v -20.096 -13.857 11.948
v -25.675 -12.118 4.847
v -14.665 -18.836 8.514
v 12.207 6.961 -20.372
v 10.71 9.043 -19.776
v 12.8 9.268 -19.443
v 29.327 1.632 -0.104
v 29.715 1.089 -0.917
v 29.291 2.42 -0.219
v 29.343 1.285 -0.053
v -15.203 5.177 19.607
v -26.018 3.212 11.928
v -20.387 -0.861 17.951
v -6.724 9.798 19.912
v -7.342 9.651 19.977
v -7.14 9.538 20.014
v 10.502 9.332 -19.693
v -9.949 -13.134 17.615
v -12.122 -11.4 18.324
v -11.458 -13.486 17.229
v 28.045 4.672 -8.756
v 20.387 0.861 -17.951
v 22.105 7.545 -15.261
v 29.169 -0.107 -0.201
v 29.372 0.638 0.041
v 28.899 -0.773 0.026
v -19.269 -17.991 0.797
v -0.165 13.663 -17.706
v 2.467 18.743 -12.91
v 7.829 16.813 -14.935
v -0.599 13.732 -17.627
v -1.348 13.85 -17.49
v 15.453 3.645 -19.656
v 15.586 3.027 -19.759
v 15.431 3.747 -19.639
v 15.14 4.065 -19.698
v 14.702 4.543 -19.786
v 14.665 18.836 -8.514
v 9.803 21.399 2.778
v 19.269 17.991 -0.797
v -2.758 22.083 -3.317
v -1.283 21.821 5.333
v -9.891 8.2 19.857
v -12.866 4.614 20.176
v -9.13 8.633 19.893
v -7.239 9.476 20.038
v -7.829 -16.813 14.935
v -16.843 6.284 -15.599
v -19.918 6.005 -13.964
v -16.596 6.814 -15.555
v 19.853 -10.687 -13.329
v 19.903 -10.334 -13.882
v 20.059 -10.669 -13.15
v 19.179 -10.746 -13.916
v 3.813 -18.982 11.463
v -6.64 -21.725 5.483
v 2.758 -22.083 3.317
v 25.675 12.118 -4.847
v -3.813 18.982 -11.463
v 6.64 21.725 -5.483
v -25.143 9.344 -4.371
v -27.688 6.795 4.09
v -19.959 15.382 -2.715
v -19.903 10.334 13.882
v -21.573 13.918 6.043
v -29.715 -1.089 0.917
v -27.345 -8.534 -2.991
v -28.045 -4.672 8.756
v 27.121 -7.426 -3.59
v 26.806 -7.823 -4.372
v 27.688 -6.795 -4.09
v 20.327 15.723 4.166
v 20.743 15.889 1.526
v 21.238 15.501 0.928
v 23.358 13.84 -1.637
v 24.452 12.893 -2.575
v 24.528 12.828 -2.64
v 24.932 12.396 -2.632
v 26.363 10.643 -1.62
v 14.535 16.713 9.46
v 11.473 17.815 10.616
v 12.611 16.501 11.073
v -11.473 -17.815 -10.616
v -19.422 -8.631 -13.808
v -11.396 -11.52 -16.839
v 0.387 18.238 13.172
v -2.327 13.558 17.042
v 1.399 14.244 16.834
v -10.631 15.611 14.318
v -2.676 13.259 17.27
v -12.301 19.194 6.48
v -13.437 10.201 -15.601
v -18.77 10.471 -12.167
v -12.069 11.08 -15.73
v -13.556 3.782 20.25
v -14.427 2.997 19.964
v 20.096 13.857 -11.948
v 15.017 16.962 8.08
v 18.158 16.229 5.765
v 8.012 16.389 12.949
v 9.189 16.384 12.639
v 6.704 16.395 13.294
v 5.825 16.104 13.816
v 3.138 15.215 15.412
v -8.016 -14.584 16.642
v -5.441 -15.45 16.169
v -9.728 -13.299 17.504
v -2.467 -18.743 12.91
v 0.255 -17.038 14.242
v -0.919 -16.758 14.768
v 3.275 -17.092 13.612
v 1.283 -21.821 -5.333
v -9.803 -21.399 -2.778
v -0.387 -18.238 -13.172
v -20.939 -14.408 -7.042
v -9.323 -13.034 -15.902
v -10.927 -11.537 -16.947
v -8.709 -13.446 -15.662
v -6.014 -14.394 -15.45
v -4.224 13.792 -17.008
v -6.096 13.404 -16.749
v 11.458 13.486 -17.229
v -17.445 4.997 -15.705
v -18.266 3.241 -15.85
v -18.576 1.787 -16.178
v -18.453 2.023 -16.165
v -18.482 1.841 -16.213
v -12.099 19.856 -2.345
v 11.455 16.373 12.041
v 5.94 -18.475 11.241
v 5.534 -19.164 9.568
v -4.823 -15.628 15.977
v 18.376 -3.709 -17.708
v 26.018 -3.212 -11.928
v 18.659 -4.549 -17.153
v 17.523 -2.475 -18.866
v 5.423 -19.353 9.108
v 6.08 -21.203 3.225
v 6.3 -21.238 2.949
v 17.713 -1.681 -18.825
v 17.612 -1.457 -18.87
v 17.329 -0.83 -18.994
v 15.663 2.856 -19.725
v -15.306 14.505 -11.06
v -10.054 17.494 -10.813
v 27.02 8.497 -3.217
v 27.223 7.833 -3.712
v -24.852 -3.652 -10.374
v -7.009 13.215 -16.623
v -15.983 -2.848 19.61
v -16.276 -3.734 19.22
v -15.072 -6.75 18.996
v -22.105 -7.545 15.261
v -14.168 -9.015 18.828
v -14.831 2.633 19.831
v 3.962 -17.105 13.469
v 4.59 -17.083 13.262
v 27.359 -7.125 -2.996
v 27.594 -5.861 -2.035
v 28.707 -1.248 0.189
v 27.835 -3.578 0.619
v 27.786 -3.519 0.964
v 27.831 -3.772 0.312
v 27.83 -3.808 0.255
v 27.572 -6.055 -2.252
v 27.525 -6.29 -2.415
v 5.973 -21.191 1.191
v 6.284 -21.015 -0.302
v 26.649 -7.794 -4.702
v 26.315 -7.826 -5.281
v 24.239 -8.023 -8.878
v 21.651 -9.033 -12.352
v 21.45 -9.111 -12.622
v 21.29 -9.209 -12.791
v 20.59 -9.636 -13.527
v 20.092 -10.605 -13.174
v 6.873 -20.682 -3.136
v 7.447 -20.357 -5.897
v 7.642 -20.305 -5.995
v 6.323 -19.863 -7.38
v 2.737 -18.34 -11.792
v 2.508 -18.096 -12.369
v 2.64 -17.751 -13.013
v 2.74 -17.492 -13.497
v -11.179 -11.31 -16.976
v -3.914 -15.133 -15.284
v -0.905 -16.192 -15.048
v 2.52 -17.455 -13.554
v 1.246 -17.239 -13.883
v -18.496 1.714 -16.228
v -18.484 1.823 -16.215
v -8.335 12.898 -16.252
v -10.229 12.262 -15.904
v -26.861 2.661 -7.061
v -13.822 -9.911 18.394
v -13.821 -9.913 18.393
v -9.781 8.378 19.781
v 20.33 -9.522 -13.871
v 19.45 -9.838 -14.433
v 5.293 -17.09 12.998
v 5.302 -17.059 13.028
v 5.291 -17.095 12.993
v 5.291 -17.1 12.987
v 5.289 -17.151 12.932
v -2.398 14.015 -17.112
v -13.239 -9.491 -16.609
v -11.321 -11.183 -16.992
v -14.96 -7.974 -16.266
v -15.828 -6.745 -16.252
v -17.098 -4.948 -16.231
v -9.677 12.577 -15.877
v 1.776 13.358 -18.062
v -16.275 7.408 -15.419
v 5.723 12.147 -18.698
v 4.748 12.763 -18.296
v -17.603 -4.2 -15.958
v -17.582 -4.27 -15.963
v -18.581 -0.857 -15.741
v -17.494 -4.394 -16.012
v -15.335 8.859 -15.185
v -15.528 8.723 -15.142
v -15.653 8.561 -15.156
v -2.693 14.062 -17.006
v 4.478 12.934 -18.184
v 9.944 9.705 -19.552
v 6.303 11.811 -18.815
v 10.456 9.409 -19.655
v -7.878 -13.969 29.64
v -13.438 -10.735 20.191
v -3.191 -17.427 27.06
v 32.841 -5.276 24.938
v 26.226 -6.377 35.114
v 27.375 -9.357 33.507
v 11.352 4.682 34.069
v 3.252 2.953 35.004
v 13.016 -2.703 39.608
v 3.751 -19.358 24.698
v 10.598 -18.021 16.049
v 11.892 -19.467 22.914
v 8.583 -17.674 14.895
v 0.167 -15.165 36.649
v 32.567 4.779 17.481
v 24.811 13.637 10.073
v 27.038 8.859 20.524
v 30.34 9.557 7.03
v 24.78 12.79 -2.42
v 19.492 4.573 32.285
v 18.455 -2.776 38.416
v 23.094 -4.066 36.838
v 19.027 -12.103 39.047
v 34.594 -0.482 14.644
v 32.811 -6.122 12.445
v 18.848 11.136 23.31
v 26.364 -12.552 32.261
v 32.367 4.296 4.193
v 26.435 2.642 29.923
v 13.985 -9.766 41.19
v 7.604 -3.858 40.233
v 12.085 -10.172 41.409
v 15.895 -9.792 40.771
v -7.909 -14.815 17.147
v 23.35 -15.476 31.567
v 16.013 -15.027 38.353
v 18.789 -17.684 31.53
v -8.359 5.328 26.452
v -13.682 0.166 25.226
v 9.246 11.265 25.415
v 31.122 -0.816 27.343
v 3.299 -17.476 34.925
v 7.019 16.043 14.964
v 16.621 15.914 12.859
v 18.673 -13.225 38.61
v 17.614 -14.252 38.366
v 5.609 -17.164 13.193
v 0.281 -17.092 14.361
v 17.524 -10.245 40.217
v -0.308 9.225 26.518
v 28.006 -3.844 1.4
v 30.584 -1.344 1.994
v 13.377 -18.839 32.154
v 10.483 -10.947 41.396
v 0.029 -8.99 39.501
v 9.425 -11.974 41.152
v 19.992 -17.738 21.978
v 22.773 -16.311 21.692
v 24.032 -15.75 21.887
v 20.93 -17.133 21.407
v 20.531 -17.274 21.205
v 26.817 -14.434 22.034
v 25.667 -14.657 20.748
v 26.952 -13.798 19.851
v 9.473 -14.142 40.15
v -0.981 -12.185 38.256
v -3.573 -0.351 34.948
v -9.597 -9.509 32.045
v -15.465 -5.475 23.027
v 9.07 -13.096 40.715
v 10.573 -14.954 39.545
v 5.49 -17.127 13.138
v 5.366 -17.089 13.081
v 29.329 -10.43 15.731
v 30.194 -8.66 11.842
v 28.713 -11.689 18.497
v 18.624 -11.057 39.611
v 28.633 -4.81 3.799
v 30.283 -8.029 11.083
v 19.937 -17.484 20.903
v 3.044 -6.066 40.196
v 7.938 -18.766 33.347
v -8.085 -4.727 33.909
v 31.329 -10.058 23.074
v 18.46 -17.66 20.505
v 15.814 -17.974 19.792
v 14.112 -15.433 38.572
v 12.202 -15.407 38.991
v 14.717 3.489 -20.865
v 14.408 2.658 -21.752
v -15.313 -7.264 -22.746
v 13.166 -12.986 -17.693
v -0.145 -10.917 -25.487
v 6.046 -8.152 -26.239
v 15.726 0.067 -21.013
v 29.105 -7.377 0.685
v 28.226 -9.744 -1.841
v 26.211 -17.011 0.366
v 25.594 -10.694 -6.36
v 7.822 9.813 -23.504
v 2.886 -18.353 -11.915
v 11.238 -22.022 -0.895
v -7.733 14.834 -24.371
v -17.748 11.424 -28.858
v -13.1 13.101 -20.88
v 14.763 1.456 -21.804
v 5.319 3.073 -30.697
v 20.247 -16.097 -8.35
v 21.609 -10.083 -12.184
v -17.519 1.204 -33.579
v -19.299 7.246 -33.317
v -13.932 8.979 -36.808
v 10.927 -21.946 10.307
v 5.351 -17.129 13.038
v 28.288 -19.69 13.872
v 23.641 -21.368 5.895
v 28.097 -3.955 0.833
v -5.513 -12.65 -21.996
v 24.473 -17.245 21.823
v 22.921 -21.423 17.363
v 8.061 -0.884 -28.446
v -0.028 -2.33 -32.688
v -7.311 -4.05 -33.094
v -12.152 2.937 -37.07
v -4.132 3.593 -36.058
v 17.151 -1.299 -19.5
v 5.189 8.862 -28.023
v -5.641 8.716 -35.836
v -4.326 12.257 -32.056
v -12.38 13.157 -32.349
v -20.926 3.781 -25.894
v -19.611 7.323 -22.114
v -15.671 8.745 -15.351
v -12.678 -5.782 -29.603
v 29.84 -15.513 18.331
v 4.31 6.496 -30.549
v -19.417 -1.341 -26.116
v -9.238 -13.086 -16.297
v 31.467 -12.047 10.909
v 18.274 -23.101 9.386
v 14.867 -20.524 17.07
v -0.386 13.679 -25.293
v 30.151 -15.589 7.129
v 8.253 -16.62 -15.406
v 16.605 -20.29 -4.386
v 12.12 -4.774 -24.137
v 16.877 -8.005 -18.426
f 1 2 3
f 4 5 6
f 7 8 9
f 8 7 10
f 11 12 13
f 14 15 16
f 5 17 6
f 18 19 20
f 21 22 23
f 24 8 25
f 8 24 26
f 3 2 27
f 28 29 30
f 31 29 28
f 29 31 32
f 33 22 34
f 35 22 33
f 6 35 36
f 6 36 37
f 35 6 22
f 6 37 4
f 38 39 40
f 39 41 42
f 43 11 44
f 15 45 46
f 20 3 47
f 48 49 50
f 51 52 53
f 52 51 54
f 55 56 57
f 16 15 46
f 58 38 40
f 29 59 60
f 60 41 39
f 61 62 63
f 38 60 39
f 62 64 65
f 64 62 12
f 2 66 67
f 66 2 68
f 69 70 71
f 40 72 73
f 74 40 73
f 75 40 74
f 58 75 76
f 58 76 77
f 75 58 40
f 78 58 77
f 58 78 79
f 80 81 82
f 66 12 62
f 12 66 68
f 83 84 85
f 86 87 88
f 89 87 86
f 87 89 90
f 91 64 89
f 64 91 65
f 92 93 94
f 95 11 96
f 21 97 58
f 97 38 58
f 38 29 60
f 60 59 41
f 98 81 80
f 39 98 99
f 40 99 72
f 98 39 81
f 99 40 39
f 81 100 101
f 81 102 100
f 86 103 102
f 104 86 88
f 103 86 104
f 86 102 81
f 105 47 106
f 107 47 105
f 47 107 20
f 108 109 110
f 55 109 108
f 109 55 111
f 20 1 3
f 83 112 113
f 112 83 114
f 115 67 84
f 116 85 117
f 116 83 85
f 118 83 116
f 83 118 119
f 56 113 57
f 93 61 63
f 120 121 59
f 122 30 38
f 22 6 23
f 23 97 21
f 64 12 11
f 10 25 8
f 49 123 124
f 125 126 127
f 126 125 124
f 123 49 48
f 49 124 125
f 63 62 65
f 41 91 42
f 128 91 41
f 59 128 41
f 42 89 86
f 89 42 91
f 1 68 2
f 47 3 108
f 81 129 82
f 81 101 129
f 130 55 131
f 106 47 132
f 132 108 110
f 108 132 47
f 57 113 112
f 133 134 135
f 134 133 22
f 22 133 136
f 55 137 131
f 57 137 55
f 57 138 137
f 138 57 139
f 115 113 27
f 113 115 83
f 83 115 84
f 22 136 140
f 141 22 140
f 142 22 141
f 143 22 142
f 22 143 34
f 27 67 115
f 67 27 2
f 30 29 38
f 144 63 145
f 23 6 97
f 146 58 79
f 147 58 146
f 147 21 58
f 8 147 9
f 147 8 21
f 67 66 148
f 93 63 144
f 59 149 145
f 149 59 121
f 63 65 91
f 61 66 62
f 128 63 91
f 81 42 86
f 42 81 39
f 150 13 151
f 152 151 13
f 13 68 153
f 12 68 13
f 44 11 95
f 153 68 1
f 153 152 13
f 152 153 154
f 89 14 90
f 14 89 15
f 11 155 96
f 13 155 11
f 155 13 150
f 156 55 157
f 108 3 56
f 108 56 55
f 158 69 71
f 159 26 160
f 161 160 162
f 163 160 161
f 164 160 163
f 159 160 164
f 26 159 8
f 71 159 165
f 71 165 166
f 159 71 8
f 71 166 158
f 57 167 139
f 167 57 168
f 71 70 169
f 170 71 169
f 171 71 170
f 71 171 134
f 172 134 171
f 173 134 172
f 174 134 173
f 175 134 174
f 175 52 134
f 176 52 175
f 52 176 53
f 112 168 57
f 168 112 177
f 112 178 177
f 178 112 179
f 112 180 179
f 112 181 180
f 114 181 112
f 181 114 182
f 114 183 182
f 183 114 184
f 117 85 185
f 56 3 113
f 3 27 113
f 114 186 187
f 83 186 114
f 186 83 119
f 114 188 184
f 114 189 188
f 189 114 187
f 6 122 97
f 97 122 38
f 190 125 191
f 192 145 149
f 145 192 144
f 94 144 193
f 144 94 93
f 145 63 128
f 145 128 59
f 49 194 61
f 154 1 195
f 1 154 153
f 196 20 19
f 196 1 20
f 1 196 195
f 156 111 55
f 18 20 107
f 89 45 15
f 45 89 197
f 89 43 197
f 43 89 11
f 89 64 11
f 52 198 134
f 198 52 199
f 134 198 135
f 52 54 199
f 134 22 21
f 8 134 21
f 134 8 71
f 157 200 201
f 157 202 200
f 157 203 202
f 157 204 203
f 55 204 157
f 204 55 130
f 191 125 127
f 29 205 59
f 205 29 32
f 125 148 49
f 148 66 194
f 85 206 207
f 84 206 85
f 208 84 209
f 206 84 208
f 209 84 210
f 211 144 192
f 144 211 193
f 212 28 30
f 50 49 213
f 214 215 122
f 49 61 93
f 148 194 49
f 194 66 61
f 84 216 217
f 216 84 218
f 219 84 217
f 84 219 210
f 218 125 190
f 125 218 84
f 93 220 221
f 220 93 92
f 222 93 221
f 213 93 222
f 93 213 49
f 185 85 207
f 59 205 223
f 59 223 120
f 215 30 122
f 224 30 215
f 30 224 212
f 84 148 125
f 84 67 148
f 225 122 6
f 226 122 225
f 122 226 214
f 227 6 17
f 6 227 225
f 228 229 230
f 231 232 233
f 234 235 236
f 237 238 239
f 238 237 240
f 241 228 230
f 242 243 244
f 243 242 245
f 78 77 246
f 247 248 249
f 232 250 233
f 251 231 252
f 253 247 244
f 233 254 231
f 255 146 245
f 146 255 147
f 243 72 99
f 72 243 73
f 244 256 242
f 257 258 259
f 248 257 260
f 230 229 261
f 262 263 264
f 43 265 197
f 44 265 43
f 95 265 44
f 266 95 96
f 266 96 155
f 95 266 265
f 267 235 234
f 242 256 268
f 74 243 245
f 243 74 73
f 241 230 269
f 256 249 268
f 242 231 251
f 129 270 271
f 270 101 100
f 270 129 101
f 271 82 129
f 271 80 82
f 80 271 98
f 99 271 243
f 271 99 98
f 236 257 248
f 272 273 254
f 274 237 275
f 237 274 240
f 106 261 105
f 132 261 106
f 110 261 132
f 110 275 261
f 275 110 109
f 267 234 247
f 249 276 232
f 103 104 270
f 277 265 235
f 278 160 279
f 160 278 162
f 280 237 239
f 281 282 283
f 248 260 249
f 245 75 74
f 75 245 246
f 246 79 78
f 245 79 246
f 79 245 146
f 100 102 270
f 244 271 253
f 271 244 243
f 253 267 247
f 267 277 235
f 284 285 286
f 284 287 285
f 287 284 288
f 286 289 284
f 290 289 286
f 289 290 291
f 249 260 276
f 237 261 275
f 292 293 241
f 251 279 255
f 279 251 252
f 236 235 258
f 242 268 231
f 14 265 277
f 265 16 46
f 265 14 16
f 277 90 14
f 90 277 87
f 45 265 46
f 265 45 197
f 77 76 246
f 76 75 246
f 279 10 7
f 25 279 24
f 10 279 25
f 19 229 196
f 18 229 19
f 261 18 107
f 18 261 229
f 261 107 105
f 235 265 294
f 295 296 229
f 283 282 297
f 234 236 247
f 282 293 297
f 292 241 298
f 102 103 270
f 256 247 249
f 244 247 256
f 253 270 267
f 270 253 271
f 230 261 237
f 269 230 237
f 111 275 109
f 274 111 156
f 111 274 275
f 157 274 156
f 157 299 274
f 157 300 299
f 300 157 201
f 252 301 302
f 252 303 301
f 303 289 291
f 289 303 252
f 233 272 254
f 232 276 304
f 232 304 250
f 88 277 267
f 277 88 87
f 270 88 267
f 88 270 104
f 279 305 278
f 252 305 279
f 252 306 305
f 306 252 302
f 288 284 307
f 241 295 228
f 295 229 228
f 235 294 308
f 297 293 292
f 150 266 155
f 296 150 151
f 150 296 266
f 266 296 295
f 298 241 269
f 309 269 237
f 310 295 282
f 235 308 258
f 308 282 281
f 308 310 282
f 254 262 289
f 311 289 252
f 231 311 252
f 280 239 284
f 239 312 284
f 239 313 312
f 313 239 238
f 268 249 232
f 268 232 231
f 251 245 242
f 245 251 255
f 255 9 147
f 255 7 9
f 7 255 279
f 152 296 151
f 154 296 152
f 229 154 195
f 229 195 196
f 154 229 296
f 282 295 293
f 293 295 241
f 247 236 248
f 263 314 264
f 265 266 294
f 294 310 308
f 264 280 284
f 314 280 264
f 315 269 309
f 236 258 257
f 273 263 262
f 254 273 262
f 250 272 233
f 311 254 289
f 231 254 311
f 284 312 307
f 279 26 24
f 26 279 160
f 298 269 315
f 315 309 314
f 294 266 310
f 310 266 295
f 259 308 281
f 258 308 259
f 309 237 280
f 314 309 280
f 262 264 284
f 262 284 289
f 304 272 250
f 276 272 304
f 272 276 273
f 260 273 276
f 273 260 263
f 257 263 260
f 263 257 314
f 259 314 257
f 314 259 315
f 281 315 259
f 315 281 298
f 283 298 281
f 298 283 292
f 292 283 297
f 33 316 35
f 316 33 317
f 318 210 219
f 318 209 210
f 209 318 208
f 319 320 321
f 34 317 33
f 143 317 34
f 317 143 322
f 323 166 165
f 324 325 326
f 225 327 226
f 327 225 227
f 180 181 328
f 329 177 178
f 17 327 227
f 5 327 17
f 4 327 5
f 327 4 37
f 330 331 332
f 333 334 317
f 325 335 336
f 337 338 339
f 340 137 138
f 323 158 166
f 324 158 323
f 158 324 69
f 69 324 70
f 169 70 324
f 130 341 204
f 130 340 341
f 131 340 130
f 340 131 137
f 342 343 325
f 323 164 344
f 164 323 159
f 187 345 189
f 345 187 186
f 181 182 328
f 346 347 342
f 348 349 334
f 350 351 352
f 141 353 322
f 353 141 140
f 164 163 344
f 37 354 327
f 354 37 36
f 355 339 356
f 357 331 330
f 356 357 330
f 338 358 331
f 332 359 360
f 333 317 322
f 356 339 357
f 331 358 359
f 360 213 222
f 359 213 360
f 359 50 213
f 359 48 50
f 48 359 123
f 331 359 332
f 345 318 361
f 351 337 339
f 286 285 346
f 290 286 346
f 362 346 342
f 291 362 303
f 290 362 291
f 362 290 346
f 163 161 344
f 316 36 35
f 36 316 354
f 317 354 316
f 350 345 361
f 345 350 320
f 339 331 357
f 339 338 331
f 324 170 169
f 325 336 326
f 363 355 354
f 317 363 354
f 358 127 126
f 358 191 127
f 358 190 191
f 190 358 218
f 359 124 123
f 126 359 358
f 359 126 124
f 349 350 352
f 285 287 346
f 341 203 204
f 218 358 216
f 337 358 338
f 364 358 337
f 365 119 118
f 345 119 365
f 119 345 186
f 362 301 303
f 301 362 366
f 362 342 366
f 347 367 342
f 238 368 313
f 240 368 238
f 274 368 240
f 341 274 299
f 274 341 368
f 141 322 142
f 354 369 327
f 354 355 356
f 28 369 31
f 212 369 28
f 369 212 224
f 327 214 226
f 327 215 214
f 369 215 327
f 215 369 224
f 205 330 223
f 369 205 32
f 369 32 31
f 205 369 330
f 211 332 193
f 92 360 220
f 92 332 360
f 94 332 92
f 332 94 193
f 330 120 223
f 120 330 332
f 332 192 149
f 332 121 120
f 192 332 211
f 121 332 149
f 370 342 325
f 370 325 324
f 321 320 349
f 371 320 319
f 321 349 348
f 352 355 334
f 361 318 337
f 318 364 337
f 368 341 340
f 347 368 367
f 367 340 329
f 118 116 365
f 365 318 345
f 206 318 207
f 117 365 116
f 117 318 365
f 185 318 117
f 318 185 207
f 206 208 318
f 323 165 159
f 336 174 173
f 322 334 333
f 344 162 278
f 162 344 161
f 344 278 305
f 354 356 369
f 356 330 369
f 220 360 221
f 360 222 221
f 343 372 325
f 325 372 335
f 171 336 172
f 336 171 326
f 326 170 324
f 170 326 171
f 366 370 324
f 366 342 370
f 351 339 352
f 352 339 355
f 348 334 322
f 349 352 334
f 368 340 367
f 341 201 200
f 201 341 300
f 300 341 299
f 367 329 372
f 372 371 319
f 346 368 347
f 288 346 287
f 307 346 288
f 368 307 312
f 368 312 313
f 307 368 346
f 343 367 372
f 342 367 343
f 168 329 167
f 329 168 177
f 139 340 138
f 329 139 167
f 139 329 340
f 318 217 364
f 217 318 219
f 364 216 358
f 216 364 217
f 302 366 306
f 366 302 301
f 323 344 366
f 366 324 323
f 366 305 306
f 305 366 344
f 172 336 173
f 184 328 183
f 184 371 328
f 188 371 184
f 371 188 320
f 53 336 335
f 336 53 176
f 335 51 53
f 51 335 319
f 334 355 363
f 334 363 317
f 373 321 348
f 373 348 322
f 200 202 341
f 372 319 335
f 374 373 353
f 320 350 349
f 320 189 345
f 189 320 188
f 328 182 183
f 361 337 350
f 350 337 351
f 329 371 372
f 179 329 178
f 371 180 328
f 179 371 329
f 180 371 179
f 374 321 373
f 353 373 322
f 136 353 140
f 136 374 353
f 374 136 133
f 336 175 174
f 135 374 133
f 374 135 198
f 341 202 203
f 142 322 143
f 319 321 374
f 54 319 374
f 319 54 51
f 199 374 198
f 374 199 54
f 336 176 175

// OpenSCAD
$fn=16;

rotate(a = 27, v = [0.7, 0.3, 0.1])
union() {
scale(v = [2, 1.5, 1.5])
	sphere(r = 15);
translate(v = [6, 5, 14])
	scale(v = [1.3, 0.8, 1.5])
		sphere(r = 20);
translate(v = [6, -7, -4])
	rotate(a = 115, v =[0, 1, 0])
		scale(v = [3.8, 1.5, 1.7])
			sphere(r = 10);
}
